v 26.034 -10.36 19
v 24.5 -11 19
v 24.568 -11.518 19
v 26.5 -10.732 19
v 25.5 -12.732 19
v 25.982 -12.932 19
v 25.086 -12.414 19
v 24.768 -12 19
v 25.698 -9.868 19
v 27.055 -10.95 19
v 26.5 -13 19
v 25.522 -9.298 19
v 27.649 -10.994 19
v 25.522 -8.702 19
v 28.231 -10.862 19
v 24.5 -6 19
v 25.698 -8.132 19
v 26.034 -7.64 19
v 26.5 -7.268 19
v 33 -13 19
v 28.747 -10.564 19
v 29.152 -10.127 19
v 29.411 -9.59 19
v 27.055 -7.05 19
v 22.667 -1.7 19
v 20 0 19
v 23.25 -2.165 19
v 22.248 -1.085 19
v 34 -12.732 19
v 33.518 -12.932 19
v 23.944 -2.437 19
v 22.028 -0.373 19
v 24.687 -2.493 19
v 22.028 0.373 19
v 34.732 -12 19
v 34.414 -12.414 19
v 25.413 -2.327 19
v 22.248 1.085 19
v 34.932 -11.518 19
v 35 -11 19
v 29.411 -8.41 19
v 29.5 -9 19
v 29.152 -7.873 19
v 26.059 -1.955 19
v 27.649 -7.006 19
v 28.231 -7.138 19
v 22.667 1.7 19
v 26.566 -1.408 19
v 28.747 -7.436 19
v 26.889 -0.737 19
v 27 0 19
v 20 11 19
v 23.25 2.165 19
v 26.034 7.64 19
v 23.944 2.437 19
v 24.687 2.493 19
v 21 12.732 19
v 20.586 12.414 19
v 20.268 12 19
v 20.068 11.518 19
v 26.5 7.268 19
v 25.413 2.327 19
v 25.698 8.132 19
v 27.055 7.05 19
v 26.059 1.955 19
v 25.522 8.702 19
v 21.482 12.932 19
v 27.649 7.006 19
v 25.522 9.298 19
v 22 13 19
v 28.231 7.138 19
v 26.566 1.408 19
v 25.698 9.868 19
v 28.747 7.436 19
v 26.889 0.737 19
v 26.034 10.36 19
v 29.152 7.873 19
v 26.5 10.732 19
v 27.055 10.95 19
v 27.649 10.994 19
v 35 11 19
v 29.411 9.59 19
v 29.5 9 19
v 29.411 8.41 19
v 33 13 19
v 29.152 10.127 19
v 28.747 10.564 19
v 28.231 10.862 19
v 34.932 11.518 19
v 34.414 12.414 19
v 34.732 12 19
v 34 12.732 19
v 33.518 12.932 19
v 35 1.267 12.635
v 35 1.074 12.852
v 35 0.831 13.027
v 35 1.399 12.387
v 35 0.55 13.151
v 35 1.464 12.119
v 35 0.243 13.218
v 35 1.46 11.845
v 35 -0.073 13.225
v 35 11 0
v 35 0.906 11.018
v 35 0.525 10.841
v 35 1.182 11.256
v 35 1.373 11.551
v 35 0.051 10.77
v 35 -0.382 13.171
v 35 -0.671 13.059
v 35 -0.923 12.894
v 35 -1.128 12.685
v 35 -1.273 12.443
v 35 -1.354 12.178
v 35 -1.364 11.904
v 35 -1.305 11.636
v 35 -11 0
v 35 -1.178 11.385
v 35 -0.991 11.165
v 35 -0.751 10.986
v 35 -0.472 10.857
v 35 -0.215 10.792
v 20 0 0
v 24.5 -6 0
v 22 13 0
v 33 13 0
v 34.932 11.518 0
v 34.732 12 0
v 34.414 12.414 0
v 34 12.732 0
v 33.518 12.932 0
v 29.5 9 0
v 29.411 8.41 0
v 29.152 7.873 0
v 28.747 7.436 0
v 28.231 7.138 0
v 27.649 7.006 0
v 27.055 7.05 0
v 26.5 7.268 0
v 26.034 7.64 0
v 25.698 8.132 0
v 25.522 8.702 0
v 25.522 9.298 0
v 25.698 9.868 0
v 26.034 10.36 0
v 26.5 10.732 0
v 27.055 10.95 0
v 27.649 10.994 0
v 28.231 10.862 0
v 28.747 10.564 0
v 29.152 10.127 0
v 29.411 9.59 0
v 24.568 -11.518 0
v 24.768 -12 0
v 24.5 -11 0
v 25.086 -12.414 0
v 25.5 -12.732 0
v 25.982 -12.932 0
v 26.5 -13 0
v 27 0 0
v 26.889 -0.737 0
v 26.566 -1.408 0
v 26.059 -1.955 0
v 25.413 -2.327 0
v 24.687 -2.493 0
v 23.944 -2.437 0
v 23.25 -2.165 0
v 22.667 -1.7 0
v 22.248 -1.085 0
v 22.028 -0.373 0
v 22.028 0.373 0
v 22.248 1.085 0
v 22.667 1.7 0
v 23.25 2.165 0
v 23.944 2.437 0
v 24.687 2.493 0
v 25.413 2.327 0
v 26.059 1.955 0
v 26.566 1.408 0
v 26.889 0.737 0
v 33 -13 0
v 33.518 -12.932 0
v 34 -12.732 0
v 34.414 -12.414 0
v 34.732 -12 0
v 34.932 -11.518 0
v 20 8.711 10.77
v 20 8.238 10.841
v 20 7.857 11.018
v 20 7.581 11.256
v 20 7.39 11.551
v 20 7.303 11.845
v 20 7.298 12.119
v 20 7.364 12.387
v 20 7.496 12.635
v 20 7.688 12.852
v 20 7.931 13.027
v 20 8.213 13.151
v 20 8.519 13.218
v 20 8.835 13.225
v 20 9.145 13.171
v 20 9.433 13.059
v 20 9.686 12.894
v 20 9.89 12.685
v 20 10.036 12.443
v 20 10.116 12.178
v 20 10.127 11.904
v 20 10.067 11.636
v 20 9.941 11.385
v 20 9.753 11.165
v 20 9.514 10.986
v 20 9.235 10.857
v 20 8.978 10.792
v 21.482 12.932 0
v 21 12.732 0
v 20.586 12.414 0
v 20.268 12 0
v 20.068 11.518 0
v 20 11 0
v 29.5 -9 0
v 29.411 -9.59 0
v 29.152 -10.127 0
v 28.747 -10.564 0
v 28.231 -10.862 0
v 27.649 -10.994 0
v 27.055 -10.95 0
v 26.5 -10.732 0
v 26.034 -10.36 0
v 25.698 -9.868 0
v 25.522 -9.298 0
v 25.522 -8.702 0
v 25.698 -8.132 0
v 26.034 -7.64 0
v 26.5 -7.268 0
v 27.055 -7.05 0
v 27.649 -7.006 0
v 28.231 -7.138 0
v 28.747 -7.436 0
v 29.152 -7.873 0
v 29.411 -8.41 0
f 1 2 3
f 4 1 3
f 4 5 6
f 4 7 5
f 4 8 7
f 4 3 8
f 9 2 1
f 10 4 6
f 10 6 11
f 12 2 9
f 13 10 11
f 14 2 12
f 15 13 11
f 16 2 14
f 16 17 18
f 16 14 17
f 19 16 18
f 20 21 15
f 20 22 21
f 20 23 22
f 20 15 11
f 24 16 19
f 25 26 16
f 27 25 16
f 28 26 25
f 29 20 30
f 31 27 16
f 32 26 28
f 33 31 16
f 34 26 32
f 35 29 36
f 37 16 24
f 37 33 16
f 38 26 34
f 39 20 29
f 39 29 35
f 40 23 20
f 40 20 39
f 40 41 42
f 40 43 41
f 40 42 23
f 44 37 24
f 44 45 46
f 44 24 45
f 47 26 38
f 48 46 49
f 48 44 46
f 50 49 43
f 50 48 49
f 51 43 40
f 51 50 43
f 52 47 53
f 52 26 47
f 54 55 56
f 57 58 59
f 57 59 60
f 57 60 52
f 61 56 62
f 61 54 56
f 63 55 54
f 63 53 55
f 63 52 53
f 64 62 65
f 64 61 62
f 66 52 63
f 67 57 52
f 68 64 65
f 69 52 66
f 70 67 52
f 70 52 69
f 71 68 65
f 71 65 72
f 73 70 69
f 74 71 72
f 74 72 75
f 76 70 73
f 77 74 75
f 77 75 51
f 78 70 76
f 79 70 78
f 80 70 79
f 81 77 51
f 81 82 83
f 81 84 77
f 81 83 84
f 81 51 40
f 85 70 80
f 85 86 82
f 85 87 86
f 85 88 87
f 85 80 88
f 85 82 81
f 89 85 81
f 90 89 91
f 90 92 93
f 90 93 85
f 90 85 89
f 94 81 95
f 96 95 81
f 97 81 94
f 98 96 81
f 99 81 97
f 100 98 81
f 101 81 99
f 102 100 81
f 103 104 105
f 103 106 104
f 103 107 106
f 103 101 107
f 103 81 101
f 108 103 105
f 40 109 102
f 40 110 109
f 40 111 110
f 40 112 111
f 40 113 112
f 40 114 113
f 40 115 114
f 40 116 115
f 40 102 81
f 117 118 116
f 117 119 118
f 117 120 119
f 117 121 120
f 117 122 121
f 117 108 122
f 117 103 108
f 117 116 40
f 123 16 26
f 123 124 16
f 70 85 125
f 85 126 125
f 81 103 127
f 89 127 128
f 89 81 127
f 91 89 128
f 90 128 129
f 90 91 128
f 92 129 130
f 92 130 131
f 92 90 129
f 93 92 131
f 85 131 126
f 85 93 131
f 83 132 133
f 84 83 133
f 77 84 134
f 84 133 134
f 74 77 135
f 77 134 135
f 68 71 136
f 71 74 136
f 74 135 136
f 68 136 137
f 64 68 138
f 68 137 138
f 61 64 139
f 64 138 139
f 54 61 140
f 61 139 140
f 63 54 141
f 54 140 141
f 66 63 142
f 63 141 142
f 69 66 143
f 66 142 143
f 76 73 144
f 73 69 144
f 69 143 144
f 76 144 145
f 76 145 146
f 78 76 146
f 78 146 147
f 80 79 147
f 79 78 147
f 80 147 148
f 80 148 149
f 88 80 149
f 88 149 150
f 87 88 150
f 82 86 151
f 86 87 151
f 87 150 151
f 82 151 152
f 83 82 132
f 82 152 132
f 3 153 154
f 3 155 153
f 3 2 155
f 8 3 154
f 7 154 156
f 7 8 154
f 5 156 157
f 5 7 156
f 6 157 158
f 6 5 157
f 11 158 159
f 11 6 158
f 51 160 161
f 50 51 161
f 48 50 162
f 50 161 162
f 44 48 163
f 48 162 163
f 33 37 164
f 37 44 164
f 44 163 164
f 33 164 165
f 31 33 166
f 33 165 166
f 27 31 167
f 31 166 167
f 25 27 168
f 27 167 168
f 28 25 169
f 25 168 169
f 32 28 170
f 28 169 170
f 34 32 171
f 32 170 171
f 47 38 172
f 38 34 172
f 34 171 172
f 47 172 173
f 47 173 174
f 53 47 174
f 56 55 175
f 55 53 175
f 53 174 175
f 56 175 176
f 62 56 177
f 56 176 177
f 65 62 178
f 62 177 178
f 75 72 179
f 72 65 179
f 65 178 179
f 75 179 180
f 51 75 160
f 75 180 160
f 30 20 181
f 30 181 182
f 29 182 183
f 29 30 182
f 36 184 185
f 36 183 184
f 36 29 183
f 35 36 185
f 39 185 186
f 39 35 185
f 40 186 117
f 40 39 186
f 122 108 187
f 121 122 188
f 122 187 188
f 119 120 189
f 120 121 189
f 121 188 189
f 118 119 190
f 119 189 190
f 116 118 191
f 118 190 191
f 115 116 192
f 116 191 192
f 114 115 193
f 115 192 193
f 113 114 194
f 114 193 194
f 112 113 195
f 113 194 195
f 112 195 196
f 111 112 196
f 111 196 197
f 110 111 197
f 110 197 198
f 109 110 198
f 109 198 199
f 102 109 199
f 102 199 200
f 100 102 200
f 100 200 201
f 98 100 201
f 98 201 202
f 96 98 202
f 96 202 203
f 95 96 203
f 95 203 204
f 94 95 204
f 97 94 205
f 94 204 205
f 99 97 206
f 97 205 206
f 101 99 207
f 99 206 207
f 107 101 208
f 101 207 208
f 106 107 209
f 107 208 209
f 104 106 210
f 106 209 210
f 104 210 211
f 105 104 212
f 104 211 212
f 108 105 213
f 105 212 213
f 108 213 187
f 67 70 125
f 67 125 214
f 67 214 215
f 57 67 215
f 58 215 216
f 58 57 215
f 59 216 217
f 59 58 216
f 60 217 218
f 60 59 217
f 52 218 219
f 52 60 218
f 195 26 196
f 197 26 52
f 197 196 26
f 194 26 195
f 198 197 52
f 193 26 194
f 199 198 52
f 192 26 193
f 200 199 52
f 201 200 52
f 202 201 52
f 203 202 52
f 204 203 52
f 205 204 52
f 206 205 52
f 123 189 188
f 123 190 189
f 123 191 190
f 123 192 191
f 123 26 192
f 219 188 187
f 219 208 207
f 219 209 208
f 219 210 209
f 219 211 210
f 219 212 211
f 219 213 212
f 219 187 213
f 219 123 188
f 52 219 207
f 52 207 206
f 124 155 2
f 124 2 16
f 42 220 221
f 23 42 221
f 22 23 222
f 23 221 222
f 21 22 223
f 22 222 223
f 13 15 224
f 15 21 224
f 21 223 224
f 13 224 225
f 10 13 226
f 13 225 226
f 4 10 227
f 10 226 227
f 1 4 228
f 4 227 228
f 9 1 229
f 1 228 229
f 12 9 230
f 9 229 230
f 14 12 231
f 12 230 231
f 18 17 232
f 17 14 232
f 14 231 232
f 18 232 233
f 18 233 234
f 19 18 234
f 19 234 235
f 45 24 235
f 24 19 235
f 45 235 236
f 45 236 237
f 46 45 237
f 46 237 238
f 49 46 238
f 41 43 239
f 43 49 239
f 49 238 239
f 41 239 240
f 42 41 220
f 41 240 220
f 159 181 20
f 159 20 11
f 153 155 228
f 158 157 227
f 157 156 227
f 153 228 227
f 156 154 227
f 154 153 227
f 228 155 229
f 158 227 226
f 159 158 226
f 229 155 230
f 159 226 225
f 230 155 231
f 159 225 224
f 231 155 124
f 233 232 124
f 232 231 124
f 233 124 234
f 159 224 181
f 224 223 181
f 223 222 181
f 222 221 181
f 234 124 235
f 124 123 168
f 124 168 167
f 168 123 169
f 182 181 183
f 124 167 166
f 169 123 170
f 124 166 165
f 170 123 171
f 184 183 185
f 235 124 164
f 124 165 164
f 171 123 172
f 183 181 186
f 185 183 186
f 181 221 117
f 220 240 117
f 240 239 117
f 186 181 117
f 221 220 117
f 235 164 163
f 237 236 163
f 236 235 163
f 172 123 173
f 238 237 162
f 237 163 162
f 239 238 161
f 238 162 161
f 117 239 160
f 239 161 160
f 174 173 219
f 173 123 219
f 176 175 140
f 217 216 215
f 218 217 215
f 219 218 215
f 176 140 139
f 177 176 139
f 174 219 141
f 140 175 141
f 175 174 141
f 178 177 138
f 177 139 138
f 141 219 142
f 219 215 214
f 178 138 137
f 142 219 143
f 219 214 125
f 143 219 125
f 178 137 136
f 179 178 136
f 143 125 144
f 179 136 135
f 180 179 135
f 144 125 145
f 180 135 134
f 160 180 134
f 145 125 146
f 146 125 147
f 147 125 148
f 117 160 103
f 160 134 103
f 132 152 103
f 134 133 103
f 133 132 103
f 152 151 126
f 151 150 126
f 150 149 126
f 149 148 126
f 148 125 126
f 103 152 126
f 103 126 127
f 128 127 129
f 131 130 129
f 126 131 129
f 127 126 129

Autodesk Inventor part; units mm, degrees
ref_plane "YZ Plane" through (0, 0, 0) normal (1, 0, 0) x (0, 1, 0)
ref_plane "XZ Plane" through (0, 0, 0) normal (0, 1, 0) x (-1, 0, 0)
ref_plane "Work Plane1" through (0, 0, 0) normal (0, 0, 1) x (1, 0, 0)
ref_plane "Work Plane2" through (-37, -13, 19) normal (0, 0, -1) x (0, 1, 0)
sketch "Sketch1" plane through (0, 0, 0) normal (0, 0, 1) x (1, 0, 0)
  line L0 (35, 13) -> (35, -13)
  line L1 (20, 0) -> (20, 13)
  circle A0 centre (27.5, 9) radius 2 projected
  circle A1 centre (27.5, -9) radius 2 projected
  line L2 (35, 13) -> (20, 13)
  line L3 (35, -13) -> (24.5, -13)
  line L4 (24.5, -13) -> (24.5, -6)
  line L5 (20, 0) -> (20, 13)
  line L6 (-60.2, 0) -> (60.2, 0) construction
  line L7 (35, 13.1624) -> (35, -13.1624) construction
  circle A2 centre (24.5, 0) radius 2.5
  line L8 (20, -13.1624) -> (20, 13.1624) construction
  line L9 (24.5, -6) -> (20, 0)
  point P0 (0, 0)
  dimension "d1" = 3
  dimension "d26" = 26
  dimension "d29" = 7
extrude "Extrusion1" add sketch "Sketch1" along normal up to surface (19 mm away)
ref_plane "Work Plane4" through (-0.8627, 0, 12) normal (0, 0, 1) x (1, 0, 0)
sketch "Sketch4" plane through (-0.8627, 0, 12) normal (0, 0, 1) x (1, 0, 0)
  circle A0 centre (28.3627, 9) radius 2 construction
  circle A1 centre (25.3627, 0) radius 2.5 construction
  circle A2 centre (28.3627, -9) radius 2 construction
  circle A3 centre (28.3627, -9) radius 2 construction
  circle A4 centre (28.3627, 9) radius 2 construction
  line L0 (35.8627, -13) -> (35.8627, 13) construction
  line L1 (35.8627, 13) -> (20.8627, 13) construction
  line L2 (20.8627, 13) -> (20.8627, 0) construction
  line L3 (25.3627, -6) -> (25.3627, -13) construction
  line L4 (25.3627, -13) -> (35.8627, -13) construction
  line L5 (20.8627, 8.7113) -> (35.8627, 0.0511) construction
  line L6 (35.8627, -13) -> (35.8627, 13) construction
  line L7 (-2.1421, -20.2045) -> (16.8579, 12.7045) construction
  line L8 (35.8627, 0.0511) -> (20.8627, 8.7113)
  line L9 (20.8627, 0) -> (25.3627, -6) projected
  point P0 (0.8627, 0)
  dimension "d6" = 4
ref_plane "Work Plane8" through (43.6603, -4.9489, 12) normal (0.866, -0.5, 0) x (0.5, 0.866, 0)
ref_plane "Work Plane7" through (35, 0.0511, 12) normal (0.866, -0.5, 0) x (0.5, 0.866, 0)
sketch "Sketch7" plane through (43.6603, -4.9489, 12) normal (0.866, -0.5, 0) x (0.5, 0.866, 0)
  point P0 (-17.5442, -12)
  point P1 (0, 0)
hole "Hole2" at (43.6603, -4.9489, 12) direction (-0.866, 0.5, 0) diameter 2.459 end through all thread size "M3x0.5" class "6H" standard "ISO Metric profile"
fillet "Fillet1" radius 2 4 edges at (35, 13, 9.5) (20, 13, 9.5) (24.5, -13, 9.5) (35, -13, 9.5)
